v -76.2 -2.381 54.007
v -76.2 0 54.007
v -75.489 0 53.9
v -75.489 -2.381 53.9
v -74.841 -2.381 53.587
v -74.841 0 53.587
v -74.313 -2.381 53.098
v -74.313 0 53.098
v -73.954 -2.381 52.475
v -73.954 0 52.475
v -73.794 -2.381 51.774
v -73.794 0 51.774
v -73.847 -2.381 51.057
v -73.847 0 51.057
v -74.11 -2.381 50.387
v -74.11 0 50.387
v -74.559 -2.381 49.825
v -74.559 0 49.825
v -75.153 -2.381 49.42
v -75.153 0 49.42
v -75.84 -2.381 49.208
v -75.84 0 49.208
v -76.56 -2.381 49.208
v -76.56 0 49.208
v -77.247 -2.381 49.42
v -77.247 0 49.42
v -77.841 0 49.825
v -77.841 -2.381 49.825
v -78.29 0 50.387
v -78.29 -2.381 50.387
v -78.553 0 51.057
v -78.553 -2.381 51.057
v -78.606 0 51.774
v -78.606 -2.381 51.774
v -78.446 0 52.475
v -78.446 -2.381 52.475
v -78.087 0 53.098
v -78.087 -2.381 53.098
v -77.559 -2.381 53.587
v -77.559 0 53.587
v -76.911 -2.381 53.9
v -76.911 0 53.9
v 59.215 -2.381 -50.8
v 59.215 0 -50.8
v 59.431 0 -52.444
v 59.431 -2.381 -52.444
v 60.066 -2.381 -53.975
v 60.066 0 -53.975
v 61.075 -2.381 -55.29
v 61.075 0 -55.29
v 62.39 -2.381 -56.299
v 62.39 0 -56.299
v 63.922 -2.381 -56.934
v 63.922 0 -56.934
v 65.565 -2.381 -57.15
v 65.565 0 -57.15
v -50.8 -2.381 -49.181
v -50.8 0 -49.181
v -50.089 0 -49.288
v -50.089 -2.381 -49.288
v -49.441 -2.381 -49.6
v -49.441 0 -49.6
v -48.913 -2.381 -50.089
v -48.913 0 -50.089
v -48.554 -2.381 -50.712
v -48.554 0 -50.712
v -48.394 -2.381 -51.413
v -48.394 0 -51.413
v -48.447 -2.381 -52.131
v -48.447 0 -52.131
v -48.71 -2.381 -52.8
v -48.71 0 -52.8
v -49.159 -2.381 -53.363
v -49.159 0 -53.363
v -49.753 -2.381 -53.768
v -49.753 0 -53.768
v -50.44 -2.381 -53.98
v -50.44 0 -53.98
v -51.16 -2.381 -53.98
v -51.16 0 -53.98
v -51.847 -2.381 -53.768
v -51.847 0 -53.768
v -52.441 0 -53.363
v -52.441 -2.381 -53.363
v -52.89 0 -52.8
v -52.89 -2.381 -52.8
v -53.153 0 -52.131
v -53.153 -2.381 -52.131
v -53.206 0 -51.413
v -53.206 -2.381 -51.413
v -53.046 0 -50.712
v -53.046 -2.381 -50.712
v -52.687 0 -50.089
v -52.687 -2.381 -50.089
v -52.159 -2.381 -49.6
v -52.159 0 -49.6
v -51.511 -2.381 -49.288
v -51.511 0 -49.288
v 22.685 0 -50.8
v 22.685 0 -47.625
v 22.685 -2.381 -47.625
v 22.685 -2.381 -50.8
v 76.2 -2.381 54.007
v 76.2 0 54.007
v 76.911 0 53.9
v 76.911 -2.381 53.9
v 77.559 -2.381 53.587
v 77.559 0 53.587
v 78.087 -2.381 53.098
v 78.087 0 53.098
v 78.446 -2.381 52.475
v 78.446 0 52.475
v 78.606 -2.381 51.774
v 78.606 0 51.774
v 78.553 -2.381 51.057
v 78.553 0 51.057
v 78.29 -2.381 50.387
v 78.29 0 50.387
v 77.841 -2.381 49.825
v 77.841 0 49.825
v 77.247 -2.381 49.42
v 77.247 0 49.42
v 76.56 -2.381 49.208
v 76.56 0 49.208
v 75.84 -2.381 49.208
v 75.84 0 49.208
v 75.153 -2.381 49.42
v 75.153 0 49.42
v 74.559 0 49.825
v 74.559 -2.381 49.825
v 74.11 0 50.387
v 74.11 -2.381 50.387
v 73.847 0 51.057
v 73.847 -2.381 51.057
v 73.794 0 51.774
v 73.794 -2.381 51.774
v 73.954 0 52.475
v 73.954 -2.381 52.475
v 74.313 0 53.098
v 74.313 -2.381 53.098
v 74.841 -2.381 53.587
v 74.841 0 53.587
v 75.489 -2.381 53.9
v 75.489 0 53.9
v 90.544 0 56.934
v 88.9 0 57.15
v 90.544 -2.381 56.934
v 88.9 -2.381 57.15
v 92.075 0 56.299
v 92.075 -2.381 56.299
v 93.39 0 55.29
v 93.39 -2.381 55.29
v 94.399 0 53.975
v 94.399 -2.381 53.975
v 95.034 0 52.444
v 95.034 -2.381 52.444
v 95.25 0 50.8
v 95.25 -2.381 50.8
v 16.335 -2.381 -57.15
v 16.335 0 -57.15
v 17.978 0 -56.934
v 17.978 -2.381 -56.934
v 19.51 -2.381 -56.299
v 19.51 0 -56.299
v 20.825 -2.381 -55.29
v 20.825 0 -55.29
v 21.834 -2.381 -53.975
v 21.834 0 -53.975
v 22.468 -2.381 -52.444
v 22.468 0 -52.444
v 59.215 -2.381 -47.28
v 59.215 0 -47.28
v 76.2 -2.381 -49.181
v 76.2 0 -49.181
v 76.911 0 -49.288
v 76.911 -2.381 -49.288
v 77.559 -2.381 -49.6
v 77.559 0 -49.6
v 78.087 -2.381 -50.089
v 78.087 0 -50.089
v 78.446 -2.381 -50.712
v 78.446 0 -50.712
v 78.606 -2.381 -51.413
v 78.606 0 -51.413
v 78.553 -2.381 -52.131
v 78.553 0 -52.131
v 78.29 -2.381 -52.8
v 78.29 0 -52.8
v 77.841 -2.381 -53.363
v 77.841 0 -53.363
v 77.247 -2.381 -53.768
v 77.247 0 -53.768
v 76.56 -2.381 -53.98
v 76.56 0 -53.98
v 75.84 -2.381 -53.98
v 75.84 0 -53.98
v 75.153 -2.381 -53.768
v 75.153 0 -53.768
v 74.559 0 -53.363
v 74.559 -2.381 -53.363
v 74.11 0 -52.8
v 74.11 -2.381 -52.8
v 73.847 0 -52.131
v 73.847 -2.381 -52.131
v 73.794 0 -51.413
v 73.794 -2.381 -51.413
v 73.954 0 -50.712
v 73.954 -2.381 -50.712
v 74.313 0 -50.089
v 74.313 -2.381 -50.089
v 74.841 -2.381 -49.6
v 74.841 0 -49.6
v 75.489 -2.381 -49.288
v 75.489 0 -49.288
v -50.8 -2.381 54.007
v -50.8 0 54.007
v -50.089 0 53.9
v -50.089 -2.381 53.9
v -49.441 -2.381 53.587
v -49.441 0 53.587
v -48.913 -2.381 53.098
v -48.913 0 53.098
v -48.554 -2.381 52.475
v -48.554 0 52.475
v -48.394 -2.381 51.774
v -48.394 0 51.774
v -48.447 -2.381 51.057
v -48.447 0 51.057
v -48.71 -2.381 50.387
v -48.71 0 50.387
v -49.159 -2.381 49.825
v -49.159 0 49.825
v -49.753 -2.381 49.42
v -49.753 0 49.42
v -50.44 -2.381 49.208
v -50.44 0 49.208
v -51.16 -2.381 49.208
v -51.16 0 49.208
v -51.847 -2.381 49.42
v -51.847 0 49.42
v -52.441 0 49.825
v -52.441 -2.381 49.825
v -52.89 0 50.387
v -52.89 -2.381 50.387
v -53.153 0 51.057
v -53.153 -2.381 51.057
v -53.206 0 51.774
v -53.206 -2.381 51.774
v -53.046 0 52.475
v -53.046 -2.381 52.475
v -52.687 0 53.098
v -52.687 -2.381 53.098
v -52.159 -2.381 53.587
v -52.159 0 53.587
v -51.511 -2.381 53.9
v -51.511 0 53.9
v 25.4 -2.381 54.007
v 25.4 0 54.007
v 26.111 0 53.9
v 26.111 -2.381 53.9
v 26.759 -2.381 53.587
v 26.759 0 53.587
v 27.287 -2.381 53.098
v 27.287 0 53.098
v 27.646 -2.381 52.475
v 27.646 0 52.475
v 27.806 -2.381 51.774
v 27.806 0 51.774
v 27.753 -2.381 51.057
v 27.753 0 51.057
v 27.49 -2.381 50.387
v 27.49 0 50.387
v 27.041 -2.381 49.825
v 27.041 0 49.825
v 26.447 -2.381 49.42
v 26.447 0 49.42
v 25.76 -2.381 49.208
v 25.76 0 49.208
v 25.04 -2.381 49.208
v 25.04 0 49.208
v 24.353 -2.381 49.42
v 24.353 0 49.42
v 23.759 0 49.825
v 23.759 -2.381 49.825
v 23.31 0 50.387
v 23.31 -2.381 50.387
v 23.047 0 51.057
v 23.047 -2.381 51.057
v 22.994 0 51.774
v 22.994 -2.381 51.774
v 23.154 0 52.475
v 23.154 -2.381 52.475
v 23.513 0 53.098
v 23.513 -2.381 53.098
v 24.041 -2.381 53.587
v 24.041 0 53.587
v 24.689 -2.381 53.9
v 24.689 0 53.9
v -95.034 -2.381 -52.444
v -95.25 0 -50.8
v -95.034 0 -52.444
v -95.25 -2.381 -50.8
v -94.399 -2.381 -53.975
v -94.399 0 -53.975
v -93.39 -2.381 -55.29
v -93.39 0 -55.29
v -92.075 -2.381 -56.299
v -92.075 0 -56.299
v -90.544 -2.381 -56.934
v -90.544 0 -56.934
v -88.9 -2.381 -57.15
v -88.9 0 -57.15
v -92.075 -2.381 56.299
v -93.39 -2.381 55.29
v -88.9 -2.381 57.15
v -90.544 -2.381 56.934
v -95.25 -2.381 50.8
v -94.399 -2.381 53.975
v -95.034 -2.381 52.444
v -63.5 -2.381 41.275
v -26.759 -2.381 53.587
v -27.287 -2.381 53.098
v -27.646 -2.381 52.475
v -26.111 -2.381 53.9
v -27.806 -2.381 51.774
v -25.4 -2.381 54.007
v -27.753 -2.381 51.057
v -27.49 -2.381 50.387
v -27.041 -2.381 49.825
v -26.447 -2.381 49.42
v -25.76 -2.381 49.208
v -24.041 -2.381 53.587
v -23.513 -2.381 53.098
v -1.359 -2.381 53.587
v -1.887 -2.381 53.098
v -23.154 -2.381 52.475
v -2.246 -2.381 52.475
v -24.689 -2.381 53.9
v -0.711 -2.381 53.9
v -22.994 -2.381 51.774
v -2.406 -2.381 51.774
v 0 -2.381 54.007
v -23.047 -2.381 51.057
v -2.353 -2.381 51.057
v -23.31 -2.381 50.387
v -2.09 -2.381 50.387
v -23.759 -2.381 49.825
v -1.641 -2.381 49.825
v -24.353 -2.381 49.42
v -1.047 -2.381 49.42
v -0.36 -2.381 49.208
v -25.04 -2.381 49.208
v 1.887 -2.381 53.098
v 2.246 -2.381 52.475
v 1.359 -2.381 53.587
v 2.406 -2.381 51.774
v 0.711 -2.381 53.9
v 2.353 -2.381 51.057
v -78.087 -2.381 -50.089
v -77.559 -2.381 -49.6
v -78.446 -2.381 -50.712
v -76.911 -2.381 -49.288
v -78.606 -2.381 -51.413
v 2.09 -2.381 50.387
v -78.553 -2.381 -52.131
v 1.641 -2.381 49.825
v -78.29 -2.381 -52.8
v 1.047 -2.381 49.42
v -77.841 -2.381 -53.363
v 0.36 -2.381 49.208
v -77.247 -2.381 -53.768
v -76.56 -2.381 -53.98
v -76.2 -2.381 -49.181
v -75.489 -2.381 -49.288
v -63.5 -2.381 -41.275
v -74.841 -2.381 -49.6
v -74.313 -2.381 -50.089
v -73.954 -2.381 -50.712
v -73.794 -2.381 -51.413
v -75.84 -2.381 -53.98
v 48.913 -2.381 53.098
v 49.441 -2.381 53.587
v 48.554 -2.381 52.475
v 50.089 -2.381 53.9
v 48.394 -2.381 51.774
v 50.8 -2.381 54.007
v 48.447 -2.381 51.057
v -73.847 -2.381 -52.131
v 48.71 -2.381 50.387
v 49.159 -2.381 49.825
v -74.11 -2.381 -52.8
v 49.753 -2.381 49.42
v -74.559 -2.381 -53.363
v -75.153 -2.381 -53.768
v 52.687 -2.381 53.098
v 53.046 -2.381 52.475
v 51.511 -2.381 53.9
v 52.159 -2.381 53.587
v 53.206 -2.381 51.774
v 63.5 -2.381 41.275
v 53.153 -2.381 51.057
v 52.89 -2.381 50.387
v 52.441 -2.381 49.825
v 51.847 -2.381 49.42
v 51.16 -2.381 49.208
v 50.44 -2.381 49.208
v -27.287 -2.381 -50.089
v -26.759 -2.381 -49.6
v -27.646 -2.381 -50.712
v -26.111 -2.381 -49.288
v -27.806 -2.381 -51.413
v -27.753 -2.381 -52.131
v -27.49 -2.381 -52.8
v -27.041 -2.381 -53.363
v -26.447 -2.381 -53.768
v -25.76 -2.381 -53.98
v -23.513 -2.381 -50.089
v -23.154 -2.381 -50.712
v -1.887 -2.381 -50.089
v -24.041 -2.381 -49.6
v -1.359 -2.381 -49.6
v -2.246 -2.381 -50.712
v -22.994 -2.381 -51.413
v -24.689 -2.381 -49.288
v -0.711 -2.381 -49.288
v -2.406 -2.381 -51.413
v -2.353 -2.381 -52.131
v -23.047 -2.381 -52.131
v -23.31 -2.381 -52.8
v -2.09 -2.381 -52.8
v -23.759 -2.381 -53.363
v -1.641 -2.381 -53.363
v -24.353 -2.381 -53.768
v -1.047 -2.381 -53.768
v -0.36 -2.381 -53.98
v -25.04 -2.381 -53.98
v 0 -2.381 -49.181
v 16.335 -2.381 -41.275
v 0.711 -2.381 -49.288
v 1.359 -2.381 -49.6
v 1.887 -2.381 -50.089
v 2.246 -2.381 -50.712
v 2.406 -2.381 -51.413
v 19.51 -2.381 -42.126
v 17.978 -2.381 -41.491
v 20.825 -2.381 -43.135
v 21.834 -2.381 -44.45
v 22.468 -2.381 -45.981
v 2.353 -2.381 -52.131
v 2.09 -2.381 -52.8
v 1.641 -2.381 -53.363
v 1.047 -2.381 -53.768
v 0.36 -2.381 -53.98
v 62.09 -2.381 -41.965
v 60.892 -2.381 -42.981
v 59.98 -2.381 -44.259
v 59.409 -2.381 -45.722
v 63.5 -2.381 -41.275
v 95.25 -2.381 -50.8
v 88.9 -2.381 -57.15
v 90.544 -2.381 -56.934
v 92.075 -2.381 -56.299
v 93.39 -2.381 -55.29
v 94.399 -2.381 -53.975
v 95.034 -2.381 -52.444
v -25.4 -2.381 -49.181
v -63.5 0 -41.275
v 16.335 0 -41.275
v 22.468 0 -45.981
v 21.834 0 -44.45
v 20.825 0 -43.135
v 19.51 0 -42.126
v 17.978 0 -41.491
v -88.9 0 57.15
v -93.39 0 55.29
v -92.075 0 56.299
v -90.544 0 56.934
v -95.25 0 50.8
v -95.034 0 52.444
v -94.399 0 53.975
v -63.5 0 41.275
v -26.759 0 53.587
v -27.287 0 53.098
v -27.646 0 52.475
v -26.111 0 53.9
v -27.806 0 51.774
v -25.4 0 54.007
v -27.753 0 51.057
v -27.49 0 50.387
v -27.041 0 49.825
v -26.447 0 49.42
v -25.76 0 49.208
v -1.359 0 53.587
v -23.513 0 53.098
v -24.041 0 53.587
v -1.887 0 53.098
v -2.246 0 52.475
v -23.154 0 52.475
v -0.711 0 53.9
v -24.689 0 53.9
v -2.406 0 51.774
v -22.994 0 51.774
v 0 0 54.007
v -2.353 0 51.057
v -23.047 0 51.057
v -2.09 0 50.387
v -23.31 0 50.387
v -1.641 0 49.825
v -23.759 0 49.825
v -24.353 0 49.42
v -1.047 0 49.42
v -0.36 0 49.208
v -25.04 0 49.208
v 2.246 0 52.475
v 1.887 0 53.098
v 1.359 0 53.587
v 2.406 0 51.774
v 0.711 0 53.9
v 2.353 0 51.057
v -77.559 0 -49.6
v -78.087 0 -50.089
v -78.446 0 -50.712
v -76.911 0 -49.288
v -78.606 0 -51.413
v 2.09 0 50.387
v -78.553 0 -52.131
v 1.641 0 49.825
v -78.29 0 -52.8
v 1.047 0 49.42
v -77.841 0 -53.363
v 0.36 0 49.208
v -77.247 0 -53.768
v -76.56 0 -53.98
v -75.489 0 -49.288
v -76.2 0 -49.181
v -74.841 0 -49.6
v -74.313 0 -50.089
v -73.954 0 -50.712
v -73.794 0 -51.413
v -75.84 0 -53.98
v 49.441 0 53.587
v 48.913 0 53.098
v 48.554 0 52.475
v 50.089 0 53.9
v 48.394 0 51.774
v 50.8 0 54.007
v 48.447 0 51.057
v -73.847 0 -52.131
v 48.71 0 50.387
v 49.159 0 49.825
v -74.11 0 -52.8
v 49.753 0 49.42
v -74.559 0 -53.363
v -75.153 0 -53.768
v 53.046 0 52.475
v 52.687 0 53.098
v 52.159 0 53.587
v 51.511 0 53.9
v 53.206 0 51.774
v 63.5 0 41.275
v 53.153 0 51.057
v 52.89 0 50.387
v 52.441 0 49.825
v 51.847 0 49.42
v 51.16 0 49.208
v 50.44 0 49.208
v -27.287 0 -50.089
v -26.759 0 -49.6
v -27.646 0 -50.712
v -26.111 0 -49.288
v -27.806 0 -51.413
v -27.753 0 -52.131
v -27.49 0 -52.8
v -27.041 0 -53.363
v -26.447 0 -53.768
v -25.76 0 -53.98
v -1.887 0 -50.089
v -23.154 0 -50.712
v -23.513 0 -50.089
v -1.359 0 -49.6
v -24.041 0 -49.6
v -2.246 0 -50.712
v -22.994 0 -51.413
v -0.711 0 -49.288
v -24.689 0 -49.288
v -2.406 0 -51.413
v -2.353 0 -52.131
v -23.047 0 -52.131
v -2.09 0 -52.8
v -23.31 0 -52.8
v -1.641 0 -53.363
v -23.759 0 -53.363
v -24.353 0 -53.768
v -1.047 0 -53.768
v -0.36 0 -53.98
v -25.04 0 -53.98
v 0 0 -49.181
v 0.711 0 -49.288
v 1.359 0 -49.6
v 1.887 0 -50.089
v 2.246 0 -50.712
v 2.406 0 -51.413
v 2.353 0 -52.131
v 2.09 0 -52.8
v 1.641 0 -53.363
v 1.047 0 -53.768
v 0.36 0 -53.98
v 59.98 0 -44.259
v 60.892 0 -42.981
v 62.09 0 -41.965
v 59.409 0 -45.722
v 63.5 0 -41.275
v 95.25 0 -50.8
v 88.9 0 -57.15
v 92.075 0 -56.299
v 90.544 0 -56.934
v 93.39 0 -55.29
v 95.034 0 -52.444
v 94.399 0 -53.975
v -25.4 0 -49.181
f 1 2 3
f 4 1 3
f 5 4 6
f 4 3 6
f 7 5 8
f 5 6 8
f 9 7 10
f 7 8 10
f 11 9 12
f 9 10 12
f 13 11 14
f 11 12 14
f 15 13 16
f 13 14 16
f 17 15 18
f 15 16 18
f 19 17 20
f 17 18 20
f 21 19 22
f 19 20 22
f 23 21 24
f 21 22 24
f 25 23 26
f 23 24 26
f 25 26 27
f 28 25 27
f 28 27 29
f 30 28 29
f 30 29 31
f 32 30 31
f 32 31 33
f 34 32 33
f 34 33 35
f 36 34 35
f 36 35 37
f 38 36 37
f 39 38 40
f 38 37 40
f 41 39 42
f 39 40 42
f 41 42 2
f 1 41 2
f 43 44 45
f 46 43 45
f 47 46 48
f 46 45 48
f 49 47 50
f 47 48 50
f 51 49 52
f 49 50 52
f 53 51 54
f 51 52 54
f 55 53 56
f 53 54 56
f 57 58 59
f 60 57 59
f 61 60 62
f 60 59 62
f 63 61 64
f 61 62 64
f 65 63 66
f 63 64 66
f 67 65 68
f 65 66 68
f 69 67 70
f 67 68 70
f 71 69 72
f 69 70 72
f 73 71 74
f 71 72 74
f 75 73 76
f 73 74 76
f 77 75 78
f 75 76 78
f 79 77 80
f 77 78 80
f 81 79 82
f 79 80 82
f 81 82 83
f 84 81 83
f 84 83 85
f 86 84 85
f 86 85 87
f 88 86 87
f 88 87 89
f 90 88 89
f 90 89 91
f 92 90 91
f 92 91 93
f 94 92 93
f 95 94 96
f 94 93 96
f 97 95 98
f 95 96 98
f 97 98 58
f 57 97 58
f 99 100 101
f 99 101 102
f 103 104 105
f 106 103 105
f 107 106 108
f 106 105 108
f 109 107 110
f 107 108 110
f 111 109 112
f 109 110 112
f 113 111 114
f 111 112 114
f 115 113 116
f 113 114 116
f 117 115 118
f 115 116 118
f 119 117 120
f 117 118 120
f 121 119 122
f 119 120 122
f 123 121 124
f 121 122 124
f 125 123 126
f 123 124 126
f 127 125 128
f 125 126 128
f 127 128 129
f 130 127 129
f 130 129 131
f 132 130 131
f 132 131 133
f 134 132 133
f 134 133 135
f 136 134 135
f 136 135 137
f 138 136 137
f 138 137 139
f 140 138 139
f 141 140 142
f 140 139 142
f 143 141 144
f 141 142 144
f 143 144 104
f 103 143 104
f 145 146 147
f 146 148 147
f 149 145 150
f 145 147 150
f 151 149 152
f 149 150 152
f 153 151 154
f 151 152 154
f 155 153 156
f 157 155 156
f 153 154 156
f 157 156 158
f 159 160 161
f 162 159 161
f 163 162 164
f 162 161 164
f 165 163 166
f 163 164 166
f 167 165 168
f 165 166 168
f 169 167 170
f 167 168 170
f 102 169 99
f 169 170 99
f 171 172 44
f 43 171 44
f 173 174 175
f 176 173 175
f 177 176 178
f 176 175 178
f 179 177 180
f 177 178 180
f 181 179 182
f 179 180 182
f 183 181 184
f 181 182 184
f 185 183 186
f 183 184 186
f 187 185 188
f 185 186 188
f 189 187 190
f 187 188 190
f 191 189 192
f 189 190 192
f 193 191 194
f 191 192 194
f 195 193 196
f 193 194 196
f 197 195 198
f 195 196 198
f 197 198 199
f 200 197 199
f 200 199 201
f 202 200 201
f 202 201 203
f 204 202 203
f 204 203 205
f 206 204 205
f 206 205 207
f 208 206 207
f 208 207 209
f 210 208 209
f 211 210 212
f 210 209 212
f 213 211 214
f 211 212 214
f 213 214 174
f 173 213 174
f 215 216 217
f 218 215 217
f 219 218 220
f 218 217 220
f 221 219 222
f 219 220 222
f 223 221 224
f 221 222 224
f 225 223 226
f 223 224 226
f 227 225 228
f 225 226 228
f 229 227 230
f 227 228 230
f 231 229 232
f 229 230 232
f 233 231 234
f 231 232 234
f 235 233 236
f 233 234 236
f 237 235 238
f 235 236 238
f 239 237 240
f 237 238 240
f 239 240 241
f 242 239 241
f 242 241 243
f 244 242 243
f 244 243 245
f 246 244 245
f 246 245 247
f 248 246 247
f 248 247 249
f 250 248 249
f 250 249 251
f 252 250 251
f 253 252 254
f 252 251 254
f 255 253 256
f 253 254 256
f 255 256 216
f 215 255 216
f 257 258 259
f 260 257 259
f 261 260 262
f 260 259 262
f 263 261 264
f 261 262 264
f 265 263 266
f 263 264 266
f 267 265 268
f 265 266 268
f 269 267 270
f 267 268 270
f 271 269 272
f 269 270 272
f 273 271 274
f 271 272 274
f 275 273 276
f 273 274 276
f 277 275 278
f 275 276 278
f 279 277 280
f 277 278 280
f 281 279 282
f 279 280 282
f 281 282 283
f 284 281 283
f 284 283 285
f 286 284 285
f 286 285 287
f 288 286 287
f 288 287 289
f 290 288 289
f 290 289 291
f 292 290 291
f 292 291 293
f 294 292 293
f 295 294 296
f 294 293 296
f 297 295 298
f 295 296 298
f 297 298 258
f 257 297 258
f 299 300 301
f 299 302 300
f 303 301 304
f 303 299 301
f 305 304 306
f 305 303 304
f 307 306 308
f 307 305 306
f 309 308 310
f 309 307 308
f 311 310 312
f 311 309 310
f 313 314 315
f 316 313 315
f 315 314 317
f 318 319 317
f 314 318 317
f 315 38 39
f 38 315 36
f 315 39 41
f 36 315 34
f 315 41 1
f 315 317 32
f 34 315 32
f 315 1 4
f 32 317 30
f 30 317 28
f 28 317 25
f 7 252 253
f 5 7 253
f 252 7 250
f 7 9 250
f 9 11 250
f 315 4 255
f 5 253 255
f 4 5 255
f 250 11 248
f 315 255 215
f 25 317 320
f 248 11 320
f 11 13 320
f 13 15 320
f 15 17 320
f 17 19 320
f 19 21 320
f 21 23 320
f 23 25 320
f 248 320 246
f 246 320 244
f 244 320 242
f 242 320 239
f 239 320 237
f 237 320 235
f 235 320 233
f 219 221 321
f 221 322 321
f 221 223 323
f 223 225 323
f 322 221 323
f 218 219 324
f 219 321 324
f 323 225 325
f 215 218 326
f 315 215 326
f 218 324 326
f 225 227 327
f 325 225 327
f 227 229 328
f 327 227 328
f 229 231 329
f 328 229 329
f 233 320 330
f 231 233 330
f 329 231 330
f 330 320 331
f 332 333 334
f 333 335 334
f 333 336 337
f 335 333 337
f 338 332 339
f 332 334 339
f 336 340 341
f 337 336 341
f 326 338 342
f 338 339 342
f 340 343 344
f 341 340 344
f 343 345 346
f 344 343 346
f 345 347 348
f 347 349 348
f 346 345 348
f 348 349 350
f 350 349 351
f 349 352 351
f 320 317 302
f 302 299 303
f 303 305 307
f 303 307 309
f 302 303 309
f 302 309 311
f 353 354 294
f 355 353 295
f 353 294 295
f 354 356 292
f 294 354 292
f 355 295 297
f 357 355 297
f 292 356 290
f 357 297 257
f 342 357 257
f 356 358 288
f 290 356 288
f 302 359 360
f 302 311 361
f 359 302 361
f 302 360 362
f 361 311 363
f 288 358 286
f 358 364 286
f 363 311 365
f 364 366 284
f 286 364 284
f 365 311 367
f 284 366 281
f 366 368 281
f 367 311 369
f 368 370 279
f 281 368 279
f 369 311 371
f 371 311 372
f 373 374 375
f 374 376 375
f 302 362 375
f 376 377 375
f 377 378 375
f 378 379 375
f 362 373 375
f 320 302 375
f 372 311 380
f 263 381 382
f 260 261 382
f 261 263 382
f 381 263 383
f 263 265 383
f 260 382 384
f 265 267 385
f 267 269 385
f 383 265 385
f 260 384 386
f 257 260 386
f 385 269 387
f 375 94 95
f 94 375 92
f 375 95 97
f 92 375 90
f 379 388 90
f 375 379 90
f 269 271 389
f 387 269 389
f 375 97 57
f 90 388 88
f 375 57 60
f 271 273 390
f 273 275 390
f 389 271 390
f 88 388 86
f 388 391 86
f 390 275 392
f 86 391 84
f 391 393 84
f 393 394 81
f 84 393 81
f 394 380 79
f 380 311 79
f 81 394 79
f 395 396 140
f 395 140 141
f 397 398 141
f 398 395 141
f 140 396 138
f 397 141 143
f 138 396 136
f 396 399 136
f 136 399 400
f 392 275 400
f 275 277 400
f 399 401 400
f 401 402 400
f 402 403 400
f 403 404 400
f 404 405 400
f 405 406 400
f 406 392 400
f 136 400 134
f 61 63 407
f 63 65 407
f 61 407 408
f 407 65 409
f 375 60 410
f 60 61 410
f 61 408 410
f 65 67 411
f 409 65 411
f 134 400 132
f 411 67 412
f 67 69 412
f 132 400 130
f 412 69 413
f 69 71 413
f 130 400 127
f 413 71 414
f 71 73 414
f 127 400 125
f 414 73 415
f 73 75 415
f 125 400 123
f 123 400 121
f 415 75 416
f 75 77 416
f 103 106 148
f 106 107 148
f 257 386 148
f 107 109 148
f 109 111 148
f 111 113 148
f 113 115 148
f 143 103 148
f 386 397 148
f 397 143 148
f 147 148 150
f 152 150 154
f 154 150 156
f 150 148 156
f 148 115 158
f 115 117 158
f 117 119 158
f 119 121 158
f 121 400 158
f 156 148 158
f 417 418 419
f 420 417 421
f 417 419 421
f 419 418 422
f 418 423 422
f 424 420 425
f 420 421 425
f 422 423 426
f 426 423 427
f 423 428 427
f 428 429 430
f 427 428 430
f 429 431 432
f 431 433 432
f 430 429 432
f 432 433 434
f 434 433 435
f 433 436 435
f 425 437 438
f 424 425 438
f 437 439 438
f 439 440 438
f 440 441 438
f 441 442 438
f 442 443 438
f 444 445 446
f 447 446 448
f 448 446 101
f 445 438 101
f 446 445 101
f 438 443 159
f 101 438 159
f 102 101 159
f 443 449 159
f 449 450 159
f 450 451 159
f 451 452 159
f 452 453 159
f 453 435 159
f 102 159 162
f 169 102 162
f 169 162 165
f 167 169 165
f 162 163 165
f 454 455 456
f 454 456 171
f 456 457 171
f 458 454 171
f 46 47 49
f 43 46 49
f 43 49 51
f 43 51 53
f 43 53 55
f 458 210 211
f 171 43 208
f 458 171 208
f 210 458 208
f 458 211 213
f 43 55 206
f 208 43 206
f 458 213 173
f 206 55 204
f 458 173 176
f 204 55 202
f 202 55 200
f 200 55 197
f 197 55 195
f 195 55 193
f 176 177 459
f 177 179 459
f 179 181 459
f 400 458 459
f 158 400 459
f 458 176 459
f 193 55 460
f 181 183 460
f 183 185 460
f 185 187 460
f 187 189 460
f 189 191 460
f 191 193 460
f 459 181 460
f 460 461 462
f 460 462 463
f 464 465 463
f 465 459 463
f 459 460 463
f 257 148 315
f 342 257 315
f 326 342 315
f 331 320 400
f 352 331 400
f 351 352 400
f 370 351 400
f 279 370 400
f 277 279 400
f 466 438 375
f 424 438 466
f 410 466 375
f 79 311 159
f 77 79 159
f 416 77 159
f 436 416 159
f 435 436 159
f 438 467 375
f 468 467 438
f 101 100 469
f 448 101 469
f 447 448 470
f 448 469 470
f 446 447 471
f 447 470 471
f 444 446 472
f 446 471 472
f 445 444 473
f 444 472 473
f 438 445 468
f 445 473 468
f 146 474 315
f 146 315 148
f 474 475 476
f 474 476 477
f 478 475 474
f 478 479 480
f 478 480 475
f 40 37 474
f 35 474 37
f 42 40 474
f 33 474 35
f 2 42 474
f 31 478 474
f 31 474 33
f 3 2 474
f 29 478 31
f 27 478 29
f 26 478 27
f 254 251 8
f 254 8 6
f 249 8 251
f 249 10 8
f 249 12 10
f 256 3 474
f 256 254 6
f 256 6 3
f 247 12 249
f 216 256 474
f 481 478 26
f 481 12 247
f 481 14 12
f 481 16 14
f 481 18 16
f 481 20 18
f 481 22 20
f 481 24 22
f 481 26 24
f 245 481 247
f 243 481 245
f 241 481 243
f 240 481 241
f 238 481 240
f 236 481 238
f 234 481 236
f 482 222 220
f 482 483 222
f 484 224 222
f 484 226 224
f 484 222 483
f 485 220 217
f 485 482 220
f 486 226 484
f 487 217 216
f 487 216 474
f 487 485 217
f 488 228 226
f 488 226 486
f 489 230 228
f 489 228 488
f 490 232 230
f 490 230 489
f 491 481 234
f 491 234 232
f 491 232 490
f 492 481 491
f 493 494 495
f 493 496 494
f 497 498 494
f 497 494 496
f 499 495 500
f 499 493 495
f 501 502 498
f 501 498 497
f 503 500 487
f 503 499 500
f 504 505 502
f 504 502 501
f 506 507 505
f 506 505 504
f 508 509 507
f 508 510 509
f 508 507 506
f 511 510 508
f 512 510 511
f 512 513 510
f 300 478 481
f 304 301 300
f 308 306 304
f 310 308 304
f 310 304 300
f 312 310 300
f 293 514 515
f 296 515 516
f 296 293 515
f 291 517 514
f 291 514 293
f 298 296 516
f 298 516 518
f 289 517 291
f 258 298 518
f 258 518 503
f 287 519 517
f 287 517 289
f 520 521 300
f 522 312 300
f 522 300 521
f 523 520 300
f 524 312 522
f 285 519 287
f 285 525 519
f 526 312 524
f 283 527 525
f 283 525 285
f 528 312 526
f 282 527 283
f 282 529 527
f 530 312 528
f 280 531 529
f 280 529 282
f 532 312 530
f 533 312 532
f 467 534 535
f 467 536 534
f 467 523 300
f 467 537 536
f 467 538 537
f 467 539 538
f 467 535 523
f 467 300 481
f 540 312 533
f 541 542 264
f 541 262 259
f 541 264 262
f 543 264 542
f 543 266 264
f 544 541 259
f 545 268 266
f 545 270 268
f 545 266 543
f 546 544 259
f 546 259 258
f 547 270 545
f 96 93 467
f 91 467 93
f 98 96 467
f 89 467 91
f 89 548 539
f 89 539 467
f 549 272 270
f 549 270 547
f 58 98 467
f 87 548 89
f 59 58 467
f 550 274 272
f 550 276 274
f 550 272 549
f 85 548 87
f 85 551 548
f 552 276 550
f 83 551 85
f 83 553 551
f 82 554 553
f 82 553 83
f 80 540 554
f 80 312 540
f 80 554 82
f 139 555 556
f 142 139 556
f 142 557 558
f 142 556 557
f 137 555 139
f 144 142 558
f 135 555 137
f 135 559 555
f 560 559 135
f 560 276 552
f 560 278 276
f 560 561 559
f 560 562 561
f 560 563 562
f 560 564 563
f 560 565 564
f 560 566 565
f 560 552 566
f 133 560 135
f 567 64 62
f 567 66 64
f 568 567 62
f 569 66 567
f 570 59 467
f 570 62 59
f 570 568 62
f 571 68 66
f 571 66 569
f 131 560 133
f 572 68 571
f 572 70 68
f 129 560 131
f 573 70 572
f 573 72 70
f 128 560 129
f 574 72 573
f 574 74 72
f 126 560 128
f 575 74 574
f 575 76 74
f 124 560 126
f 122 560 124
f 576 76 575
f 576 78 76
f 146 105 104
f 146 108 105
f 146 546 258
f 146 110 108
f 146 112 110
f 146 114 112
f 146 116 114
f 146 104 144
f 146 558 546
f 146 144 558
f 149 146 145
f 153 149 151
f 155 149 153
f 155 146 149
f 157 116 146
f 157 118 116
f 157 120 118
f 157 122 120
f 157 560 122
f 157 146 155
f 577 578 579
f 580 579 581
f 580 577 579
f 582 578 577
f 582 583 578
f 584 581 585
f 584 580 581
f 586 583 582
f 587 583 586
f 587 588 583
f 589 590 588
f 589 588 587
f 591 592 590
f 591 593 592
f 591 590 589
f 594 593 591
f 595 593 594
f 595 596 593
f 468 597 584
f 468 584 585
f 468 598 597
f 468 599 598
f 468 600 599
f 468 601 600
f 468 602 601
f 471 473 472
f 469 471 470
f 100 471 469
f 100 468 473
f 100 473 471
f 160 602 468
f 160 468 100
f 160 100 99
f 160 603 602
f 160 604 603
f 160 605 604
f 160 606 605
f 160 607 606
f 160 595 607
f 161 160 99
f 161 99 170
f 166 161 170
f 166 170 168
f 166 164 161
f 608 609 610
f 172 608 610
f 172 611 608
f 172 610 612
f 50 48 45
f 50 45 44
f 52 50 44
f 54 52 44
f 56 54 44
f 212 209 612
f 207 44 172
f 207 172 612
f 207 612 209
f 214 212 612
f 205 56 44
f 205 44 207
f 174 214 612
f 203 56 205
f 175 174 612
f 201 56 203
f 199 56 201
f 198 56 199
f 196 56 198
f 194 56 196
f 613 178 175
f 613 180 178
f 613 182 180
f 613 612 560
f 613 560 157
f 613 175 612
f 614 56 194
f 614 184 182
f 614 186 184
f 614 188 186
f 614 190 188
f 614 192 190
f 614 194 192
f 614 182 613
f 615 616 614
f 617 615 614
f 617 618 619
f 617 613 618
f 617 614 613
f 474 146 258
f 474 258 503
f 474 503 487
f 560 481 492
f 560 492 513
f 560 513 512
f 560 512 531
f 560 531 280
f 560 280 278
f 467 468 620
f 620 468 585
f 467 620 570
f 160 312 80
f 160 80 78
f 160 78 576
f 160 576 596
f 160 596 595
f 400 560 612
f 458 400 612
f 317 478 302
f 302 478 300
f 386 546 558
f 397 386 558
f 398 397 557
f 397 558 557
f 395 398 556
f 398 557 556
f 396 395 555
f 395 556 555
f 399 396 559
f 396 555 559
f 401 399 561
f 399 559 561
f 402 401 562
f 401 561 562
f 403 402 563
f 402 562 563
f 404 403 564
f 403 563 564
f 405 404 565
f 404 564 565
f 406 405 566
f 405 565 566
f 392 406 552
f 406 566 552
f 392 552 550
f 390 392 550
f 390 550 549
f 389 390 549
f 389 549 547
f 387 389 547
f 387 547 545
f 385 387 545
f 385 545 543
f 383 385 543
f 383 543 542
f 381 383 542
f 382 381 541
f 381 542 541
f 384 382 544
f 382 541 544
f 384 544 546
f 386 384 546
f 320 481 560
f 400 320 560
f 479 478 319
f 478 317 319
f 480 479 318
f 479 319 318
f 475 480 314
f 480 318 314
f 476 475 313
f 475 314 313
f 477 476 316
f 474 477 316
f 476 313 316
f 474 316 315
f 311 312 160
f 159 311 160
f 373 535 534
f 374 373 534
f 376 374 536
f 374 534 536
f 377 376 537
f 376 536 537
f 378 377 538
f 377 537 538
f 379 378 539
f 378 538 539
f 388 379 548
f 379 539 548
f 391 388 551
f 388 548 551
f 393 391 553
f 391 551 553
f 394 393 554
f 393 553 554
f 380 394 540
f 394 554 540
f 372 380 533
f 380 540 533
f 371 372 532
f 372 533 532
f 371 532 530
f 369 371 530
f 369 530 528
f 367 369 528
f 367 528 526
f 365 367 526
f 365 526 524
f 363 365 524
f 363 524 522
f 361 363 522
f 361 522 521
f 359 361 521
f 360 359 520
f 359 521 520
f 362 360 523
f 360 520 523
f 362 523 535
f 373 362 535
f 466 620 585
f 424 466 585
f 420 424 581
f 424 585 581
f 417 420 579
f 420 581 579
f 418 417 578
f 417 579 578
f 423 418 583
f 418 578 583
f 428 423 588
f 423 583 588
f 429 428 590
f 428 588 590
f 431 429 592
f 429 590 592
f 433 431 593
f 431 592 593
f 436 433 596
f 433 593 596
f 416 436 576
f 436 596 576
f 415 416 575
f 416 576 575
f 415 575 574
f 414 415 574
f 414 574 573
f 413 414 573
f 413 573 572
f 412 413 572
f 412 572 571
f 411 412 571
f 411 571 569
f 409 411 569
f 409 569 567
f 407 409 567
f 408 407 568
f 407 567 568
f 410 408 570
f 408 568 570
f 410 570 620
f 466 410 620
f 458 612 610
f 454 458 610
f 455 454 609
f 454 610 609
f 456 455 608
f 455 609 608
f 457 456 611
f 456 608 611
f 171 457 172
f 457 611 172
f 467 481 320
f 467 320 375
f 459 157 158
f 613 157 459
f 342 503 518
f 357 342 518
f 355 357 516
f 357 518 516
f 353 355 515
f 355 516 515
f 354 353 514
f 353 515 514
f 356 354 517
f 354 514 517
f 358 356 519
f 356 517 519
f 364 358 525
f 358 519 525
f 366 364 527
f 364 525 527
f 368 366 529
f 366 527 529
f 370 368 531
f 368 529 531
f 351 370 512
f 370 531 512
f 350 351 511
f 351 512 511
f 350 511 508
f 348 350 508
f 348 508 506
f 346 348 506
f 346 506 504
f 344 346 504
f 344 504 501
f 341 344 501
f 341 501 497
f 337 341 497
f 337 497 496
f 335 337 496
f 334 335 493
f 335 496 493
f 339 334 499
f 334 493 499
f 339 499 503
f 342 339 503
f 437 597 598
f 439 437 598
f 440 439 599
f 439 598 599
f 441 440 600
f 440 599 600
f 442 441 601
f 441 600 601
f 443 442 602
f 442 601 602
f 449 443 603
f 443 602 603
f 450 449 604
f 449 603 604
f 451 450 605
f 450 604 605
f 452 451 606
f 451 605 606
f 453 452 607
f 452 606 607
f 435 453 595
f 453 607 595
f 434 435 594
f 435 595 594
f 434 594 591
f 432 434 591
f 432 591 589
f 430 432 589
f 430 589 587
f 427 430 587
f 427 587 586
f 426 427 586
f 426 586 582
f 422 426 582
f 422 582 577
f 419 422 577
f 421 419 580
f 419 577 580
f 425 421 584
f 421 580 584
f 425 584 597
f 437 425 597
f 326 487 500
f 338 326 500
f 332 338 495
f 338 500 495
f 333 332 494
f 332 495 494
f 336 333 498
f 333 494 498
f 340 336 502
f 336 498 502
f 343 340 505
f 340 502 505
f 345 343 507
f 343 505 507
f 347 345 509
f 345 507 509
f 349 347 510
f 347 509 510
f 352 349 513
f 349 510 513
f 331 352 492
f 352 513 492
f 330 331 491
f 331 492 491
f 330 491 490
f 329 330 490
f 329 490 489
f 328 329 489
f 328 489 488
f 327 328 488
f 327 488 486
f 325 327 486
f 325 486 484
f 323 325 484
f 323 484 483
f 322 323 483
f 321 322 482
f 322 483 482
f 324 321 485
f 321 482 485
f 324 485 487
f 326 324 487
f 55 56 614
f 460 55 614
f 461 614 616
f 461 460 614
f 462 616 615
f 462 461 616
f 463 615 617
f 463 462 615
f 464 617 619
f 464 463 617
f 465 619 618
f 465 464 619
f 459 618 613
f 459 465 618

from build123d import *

# Parameters (mm, degrees)
SKETCH1_W          = 190.5
SKETCH1_H          = 114.3
SKETCH1_R          = 2.413
SKETCH1_W_2        = 127
SKETCH1_H_2        = 82.55
BASE_FLANGE1_DEPTH = 2.38125
FILLET1_R          = 6.35
SKETCH2_W          = 36.53028
SKETCH2_H          = 15.875
CUT_EXTRUDE1_DEPTH = 2.54
FILLET2_R          = 6.35


# Sheet-metal steps are written as plain solids
with BuildPart() as part:
    # Sketch1 → Base-Flange1 (new body)
    with BuildSketch(Plane(origin=(0, 0, 0), x_dir=(1, 0, 0), z_dir=(0, 1, 0))):
        Rectangle(SKETCH1_W, SKETCH1_H)
        with Locations(Location((-76.2, -51.59375, 0), (0, 0, 270))):
            Circle(SKETCH1_R, mode=Mode.SUBTRACT)
        with Locations(Location((-50.8, -51.59375, 0), (0, 0, 270))):
            Circle(SKETCH1_R, mode=Mode.SUBTRACT)
        with Locations(Location((-25.4, -51.59375, 0), (0, 0, 270))):
            Circle(SKETCH1_R, mode=Mode.SUBTRACT)
        with Locations(Location((0, -51.59375, 0), (0, 0, 270))):
            Circle(SKETCH1_R, mode=Mode.SUBTRACT)
        with Locations(Location((25.4, -51.59375, 0), (0, 0, 270))):
            Circle(SKETCH1_R, mode=Mode.SUBTRACT)
        with Locations(Location((50.8, -51.59375, 0), (0, 0, 270))):
            Circle(SKETCH1_R, mode=Mode.SUBTRACT)
        with Locations(Location((76.2, -51.59375, 0), (0, 0, 270))):
            Circle(SKETCH1_R, mode=Mode.SUBTRACT)
        with Locations(Location((76.2, 51.59375, 0), (0, 0, 270))):
            Circle(SKETCH1_R, mode=Mode.SUBTRACT)
        with Locations(Location((50.8, 51.59375, 0), (0, 0, 270))):
            Circle(SKETCH1_R, mode=Mode.SUBTRACT)
        with Locations(Location((25.4, 51.59375, 0), (0, 0, 270))):
            Circle(SKETCH1_R, mode=Mode.SUBTRACT)
        with Locations(Location((0, 51.59375, 0), (0, 0, 270))):
            Circle(SKETCH1_R, mode=Mode.SUBTRACT)
        with Locations(Location((-25.4, 51.59375, 0), (0, 0, 270))):
            Circle(SKETCH1_R, mode=Mode.SUBTRACT)
        with Locations(Location((-50.8, 51.59375, 0), (0, 0, 270))):
            Circle(SKETCH1_R, mode=Mode.SUBTRACT)
        with Locations(Location((-76.2, 51.59375, 0), (0, 0, 270))):
            Circle(SKETCH1_R, mode=Mode.SUBTRACT)
        Rectangle(SKETCH1_W_2, SKETCH1_H_2, mode=Mode.SUBTRACT)
    extrude(amount=-BASE_FLANGE1_DEPTH)

    # Fillet1
    fillet1_edges = [part.edges().sort_by_distance(p)[0] for p in [
        (-95.25, -1.190625, -57.15),
        (95.25, -1.190625, -57.15),
        (95.25, -1.190625, 57.15),
        (-95.25, -1.190625, 57.15),
    ]]
    fillet(fillet1_edges, radius=FILLET1_R)

    # Sketch2 → Cut-Extrude1 (cut)
    with BuildSketch(Plane(origin=(0, 0, 0), x_dir=(1, 0, 0), z_dir=(0, 1, 0))):
        with Locations((40.94988, 49.2125)):
            Rectangle(SKETCH2_W, SKETCH2_H)
    extrude(amount=-CUT_EXTRUDE1_DEPTH, mode=Mode.SUBTRACT)

    # Fillet2
    # the kernel refuses this fillet: 6.35 mm, written as the material it takes off along each edge
    with BuildSketch(Plane(origin=(59.21502, 15.012118521, -41.275), x_dir=(0, 0, -1), z_dir=(0, -1, 0))) as fillet2_piece_1:
        with BuildLine():
            CenterArc((6.004847409, 6.35), FILLET2_R, 198.977692365, 71.022307635)
            Line((0, 4.28498), (-0.120096948, 4.2436796))
            ThreePointArc((-0.120096948, 4.2436796), (-0.127, 2.14249), (-0.127, 0))
            Line((-0.127, 0), (0, -0.127))
            Line((0, -0.127), (6.004847409, -0.127))
            Line((6.004847409, -0.127), (6.004847409, 0))
        make_face()
    extrude(amount=32.405487043, mode=Mode.SUBTRACT)
    with BuildSketch(Plane(origin=(22.68474, 15.875, -41.275), x_dir=(-1, 0, 0), z_dir=(0, -1, 0)), Plane(origin=(22.68474, 15.875, -57.15), x_dir=(0, 0, 1), z_dir=(0, -1, 0)), Plane(origin=(59.21502, 15.875, -57.15), x_dir=(1, 0, 0), z_dir=(0, -1, 0))) as fillet2_piece_2:
        with BuildLine():
            CenterArc((FILLET2_R, FILLET2_R), FILLET2_R, 180, 90)
            Line((0, FILLET2_R), (-FILLET2_R * 0.02, FILLET2_R))
            Line((-FILLET2_R * 0.02, FILLET2_R), (-FILLET2_R * 0.02, -FILLET2_R * 0.02))
            Line((-FILLET2_R * 0.02, -FILLET2_R * 0.02), (FILLET2_R, -FILLET2_R * 0.02))
            Line((FILLET2_R, -FILLET2_R * 0.02), (FILLET2_R, 0))
        make_face()
    extrude(amount=34.13125, mode=Mode.SUBTRACT)


solid = part.part
